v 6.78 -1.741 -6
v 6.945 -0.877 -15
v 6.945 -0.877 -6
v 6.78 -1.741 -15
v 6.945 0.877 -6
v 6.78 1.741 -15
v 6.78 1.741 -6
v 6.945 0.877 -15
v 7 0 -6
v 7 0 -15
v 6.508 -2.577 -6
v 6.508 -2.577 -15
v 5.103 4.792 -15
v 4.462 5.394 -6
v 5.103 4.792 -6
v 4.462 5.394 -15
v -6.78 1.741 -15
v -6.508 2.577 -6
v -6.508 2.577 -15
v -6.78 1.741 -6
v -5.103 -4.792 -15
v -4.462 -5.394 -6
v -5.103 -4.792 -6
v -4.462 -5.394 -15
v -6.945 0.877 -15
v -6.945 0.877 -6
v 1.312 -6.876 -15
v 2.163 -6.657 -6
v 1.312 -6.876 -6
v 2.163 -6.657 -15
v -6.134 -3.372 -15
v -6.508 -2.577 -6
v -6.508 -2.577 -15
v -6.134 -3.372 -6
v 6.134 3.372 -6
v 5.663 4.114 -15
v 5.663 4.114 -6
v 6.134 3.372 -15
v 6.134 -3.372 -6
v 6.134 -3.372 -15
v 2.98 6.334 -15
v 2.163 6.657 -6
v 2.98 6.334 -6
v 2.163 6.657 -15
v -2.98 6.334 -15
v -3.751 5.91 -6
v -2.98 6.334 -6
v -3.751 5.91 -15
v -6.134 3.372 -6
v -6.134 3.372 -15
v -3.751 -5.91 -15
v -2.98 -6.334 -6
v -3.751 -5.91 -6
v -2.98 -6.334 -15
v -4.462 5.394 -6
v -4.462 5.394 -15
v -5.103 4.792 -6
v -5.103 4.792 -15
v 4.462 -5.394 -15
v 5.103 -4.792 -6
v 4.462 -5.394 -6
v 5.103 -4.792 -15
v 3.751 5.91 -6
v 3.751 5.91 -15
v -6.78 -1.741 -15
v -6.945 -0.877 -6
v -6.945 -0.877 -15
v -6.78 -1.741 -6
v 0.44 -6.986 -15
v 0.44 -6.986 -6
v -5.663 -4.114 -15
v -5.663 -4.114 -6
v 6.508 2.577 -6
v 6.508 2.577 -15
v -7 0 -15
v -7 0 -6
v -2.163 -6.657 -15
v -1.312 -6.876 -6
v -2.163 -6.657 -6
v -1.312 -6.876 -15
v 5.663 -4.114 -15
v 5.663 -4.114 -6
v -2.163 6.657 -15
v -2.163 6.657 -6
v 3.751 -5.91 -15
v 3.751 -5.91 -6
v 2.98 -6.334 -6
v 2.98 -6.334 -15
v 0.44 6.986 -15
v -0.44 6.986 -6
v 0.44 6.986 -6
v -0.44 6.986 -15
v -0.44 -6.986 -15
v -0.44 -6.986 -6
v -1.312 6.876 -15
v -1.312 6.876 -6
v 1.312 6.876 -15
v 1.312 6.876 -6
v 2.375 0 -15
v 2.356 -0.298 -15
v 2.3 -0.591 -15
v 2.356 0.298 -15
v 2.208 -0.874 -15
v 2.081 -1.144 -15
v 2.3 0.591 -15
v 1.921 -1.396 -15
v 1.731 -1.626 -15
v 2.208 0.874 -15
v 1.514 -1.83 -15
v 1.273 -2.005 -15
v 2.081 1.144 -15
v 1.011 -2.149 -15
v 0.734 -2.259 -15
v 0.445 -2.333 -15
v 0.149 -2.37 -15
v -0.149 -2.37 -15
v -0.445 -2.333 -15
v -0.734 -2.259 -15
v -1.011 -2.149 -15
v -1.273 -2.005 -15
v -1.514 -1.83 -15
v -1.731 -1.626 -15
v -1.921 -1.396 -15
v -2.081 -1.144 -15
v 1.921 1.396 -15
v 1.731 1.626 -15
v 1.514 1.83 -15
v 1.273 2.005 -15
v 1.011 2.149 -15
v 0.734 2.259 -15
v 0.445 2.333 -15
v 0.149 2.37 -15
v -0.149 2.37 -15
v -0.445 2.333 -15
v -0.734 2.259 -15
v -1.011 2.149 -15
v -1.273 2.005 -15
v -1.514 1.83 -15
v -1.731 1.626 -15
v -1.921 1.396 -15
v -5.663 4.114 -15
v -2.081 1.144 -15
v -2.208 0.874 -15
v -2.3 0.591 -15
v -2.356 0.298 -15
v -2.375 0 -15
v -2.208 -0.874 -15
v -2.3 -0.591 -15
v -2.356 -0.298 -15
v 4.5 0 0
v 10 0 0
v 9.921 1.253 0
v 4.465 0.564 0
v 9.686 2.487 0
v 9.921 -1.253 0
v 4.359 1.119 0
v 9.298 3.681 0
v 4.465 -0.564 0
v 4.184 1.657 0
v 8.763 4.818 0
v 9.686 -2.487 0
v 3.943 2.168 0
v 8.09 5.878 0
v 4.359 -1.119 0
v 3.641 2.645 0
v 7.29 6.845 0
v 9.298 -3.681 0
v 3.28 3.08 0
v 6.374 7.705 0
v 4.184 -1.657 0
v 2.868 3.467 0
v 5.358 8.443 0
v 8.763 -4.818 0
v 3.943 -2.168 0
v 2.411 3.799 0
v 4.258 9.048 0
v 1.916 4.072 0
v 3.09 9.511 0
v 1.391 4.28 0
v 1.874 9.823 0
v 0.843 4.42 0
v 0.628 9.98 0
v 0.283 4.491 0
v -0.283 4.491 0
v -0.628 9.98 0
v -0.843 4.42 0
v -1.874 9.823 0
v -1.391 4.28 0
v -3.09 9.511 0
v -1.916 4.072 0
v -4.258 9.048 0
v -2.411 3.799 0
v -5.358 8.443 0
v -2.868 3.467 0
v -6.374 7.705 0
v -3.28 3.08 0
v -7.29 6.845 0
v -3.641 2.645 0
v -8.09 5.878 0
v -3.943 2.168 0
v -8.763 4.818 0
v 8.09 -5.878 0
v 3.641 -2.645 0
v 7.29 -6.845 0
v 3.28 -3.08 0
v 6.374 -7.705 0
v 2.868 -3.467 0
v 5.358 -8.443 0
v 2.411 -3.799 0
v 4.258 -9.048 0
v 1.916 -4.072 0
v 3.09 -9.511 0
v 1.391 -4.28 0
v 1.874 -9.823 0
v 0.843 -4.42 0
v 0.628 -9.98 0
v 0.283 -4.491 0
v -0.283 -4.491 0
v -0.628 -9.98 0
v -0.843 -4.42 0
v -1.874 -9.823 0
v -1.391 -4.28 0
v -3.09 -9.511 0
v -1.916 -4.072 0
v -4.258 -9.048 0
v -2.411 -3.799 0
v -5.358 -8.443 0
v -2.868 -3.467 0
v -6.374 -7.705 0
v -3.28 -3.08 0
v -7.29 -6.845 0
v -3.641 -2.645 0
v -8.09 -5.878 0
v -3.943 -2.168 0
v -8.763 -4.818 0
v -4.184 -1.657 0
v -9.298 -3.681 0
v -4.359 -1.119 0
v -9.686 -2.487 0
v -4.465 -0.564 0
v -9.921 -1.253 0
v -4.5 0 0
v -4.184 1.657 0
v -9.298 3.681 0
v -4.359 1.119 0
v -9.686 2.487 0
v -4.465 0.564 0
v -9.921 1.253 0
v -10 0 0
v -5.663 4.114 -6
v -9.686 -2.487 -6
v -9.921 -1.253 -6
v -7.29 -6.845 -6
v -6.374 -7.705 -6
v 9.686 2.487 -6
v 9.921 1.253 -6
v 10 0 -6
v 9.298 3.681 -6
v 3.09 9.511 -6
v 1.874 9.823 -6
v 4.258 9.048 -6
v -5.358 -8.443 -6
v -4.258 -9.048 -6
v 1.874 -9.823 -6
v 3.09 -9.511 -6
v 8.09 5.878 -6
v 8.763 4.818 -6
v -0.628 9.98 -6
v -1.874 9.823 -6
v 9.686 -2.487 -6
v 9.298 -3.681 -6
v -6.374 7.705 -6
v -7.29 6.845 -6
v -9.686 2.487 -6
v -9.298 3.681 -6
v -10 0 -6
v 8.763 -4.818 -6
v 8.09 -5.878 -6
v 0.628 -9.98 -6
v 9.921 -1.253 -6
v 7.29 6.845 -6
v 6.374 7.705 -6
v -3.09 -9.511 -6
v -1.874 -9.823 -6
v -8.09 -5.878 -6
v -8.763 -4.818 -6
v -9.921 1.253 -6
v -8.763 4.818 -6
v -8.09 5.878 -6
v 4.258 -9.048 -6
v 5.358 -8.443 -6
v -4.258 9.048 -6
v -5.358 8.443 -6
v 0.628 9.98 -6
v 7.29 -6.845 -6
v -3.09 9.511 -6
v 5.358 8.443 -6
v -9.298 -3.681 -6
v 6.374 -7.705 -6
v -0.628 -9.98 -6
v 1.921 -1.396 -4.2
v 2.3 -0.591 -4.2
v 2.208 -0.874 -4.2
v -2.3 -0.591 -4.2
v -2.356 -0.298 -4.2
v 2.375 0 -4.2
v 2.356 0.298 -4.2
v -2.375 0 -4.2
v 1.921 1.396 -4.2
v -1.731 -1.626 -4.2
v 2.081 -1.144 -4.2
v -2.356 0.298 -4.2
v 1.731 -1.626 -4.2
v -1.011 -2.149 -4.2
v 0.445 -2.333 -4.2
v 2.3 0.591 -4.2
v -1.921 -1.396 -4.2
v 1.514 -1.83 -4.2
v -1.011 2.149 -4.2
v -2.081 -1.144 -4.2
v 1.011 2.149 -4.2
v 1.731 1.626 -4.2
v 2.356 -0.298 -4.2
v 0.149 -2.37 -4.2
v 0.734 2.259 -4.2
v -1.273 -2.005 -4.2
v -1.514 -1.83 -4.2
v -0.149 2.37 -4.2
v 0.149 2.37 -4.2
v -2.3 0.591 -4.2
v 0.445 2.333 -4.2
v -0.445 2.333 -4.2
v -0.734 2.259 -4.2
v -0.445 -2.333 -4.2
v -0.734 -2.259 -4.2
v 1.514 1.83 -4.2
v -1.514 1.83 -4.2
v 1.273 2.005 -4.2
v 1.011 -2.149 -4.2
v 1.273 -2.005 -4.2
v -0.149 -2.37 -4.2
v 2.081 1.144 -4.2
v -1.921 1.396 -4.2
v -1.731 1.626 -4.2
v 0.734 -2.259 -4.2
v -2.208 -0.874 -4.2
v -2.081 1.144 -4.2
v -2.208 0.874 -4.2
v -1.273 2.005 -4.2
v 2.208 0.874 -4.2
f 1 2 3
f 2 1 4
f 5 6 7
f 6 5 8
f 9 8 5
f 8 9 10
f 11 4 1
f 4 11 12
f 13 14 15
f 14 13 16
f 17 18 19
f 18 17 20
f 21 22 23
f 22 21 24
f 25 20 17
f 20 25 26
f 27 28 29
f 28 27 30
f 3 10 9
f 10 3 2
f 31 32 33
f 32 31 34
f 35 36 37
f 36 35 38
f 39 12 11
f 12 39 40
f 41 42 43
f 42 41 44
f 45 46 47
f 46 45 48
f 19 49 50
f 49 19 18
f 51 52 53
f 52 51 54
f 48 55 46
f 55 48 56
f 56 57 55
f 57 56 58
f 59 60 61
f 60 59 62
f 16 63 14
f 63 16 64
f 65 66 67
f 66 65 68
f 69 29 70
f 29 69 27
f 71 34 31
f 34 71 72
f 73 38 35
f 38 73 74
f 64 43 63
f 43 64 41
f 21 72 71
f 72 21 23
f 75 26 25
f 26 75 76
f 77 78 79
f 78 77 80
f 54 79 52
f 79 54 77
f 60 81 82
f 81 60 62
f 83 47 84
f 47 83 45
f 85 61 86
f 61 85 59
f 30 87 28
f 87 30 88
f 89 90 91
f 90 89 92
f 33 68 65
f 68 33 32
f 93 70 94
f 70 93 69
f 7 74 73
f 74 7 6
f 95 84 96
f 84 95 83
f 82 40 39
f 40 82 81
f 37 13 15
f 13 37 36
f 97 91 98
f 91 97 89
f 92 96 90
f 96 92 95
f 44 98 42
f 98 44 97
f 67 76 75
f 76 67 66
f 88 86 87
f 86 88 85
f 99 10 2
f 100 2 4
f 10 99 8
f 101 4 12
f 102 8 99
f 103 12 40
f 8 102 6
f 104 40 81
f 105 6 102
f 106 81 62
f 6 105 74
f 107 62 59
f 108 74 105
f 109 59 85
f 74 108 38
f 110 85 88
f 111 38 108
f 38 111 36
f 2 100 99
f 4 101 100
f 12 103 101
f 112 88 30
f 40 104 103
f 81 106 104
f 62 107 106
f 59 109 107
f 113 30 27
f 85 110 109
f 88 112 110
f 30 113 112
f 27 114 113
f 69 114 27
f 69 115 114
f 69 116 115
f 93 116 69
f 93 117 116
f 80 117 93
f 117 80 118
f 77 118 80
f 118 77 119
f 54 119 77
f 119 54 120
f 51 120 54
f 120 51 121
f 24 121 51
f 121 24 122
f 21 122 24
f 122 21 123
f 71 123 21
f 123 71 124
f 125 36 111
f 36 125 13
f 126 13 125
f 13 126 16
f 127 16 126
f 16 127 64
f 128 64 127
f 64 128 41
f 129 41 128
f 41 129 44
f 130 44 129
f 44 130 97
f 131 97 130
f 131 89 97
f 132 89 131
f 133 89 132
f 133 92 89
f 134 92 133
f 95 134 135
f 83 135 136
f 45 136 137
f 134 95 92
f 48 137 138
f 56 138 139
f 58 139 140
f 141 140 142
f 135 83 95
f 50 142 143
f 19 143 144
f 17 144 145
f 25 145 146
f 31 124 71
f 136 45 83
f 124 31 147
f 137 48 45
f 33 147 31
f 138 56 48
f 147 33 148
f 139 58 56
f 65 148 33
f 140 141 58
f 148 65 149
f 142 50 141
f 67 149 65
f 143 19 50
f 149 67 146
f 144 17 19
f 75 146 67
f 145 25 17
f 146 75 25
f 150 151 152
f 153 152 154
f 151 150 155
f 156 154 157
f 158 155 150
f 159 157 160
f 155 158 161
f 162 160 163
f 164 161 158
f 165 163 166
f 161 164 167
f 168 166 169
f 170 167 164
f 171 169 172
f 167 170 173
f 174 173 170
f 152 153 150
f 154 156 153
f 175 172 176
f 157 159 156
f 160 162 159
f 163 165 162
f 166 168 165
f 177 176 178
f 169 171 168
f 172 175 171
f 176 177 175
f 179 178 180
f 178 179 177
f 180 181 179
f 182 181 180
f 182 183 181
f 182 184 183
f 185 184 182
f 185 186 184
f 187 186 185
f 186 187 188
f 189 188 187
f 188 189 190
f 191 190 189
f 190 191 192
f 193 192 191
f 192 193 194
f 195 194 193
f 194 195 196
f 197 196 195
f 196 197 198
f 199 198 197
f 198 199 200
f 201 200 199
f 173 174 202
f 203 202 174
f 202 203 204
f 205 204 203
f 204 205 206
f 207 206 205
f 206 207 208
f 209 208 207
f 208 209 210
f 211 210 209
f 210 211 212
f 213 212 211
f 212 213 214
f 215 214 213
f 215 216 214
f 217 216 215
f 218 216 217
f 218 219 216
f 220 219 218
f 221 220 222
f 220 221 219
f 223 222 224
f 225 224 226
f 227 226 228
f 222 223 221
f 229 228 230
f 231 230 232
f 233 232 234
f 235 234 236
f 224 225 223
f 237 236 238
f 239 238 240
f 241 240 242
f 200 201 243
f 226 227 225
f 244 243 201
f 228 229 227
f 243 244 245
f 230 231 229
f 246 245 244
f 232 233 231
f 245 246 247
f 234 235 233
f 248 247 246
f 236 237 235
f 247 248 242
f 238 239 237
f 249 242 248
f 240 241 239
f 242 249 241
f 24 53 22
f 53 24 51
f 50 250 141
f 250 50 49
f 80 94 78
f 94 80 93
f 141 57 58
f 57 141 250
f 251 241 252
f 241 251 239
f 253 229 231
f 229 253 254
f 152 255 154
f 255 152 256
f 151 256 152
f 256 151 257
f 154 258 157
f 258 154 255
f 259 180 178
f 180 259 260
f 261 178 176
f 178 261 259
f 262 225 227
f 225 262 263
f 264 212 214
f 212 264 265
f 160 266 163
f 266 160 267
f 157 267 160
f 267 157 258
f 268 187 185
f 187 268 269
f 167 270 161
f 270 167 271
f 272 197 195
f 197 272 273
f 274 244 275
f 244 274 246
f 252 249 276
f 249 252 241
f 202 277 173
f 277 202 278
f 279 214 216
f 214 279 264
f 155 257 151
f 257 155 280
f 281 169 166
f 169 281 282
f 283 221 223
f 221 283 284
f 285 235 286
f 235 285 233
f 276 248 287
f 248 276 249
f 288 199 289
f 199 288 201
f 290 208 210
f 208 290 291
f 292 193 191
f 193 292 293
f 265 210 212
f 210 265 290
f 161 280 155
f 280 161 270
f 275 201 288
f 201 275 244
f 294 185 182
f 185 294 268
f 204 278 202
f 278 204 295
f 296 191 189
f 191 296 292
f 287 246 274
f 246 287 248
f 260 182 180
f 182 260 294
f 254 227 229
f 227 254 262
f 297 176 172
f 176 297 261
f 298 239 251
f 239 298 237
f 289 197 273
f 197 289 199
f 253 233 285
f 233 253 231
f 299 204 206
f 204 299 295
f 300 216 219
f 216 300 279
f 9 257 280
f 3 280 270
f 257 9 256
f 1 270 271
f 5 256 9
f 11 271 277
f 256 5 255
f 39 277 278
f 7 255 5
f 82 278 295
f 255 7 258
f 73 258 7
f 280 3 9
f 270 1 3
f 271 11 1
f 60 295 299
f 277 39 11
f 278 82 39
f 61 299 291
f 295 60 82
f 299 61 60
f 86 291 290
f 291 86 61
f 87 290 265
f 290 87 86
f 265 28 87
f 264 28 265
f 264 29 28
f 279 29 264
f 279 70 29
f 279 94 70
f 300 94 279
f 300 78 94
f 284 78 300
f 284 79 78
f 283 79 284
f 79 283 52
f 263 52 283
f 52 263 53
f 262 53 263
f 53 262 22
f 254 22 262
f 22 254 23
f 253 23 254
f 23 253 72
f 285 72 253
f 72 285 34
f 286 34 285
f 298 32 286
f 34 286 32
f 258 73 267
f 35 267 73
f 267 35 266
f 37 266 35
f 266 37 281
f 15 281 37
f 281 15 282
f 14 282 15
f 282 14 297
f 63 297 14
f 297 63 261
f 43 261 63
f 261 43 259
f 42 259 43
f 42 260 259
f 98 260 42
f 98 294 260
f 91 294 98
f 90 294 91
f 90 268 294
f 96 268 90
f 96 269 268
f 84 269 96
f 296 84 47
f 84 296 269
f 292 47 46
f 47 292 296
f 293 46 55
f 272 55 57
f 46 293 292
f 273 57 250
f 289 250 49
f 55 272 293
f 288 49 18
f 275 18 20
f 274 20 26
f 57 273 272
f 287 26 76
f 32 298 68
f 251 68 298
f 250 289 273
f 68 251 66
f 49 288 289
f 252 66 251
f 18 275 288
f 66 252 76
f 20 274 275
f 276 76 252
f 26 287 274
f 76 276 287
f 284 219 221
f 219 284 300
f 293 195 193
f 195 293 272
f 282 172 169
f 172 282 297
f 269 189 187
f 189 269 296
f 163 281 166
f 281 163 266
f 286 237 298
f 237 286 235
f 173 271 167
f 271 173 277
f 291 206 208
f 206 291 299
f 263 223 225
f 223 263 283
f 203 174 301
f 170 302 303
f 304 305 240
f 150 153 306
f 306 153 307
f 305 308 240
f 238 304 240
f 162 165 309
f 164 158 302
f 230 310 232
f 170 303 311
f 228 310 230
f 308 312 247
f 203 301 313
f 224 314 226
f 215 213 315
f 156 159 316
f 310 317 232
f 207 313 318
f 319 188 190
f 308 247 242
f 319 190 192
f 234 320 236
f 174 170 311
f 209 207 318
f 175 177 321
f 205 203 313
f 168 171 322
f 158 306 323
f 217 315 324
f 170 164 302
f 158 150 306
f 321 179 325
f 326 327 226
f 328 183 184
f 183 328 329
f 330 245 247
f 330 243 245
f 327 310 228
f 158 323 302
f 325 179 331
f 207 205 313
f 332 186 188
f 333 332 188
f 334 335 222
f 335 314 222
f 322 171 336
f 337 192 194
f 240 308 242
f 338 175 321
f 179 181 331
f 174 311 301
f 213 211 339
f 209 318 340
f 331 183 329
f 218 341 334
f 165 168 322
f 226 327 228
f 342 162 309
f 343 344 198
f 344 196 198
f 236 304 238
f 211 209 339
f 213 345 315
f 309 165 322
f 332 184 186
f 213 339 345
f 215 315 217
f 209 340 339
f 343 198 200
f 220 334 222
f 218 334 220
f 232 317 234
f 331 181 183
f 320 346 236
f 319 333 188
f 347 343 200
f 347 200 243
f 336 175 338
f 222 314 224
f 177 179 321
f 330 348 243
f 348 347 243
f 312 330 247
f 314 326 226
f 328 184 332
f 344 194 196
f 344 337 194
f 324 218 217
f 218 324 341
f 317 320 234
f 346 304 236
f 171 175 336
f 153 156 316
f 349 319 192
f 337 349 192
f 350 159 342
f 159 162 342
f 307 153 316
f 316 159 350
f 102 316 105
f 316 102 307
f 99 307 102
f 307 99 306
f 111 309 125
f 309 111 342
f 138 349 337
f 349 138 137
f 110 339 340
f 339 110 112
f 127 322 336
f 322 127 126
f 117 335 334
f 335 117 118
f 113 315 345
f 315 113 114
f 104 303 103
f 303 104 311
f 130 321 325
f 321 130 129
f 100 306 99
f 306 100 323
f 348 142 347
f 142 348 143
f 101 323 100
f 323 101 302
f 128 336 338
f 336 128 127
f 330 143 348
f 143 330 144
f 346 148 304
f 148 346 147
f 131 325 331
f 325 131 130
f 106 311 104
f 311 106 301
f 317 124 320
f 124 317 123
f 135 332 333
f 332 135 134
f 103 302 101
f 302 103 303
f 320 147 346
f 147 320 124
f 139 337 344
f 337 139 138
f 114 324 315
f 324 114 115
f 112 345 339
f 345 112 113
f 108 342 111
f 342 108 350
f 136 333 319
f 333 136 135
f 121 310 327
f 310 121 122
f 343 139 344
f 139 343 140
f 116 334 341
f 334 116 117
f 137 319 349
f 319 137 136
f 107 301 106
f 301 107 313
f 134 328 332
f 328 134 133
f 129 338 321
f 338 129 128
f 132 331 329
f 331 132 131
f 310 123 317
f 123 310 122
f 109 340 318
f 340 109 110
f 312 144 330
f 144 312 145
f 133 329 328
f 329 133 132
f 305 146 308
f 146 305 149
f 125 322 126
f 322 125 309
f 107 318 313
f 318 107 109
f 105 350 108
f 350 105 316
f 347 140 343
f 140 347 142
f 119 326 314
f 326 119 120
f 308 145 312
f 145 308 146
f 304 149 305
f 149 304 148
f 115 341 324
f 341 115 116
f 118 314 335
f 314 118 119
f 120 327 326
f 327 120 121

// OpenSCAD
$fn = 50;


difference() {
	union() {
		translate(v = [0, 0, -15.0000000000]) {
			cylinder(h = 15, r = 7.0000000000);
		}
		translate(v = [0, 0, -6.0000000000]) {
			cylinder(h = 6, r = 10.0000000000);
		}
	}
	union() {
		translate(v = [0, 0, 0]) {
			rotate(a = [0, 0, 0]) {
				difference() {
					union() {
						#translate(v = [0, 0, -15.0000000000]) {
							cylinder(h = 15, r = 2.2500000000);
						}
						#translate(v = [0, 0, -4.2000000000]) {
							cylinder(h = 4.2000000000, r = 7.0000000000, r1 = 2.3750000000, r2 = 4.5000000000);
						}
						#translate(v = [0, 0, -15.0000000000]) {
							cylinder(h = 15, r = 2.3750000000);
						}
						#translate(v = [0, 0, -15.0000000000]) {
							cylinder(h = 15, r = 2.2500000000);
						}
					}
					union();
				}
			}
		}
	}
}
